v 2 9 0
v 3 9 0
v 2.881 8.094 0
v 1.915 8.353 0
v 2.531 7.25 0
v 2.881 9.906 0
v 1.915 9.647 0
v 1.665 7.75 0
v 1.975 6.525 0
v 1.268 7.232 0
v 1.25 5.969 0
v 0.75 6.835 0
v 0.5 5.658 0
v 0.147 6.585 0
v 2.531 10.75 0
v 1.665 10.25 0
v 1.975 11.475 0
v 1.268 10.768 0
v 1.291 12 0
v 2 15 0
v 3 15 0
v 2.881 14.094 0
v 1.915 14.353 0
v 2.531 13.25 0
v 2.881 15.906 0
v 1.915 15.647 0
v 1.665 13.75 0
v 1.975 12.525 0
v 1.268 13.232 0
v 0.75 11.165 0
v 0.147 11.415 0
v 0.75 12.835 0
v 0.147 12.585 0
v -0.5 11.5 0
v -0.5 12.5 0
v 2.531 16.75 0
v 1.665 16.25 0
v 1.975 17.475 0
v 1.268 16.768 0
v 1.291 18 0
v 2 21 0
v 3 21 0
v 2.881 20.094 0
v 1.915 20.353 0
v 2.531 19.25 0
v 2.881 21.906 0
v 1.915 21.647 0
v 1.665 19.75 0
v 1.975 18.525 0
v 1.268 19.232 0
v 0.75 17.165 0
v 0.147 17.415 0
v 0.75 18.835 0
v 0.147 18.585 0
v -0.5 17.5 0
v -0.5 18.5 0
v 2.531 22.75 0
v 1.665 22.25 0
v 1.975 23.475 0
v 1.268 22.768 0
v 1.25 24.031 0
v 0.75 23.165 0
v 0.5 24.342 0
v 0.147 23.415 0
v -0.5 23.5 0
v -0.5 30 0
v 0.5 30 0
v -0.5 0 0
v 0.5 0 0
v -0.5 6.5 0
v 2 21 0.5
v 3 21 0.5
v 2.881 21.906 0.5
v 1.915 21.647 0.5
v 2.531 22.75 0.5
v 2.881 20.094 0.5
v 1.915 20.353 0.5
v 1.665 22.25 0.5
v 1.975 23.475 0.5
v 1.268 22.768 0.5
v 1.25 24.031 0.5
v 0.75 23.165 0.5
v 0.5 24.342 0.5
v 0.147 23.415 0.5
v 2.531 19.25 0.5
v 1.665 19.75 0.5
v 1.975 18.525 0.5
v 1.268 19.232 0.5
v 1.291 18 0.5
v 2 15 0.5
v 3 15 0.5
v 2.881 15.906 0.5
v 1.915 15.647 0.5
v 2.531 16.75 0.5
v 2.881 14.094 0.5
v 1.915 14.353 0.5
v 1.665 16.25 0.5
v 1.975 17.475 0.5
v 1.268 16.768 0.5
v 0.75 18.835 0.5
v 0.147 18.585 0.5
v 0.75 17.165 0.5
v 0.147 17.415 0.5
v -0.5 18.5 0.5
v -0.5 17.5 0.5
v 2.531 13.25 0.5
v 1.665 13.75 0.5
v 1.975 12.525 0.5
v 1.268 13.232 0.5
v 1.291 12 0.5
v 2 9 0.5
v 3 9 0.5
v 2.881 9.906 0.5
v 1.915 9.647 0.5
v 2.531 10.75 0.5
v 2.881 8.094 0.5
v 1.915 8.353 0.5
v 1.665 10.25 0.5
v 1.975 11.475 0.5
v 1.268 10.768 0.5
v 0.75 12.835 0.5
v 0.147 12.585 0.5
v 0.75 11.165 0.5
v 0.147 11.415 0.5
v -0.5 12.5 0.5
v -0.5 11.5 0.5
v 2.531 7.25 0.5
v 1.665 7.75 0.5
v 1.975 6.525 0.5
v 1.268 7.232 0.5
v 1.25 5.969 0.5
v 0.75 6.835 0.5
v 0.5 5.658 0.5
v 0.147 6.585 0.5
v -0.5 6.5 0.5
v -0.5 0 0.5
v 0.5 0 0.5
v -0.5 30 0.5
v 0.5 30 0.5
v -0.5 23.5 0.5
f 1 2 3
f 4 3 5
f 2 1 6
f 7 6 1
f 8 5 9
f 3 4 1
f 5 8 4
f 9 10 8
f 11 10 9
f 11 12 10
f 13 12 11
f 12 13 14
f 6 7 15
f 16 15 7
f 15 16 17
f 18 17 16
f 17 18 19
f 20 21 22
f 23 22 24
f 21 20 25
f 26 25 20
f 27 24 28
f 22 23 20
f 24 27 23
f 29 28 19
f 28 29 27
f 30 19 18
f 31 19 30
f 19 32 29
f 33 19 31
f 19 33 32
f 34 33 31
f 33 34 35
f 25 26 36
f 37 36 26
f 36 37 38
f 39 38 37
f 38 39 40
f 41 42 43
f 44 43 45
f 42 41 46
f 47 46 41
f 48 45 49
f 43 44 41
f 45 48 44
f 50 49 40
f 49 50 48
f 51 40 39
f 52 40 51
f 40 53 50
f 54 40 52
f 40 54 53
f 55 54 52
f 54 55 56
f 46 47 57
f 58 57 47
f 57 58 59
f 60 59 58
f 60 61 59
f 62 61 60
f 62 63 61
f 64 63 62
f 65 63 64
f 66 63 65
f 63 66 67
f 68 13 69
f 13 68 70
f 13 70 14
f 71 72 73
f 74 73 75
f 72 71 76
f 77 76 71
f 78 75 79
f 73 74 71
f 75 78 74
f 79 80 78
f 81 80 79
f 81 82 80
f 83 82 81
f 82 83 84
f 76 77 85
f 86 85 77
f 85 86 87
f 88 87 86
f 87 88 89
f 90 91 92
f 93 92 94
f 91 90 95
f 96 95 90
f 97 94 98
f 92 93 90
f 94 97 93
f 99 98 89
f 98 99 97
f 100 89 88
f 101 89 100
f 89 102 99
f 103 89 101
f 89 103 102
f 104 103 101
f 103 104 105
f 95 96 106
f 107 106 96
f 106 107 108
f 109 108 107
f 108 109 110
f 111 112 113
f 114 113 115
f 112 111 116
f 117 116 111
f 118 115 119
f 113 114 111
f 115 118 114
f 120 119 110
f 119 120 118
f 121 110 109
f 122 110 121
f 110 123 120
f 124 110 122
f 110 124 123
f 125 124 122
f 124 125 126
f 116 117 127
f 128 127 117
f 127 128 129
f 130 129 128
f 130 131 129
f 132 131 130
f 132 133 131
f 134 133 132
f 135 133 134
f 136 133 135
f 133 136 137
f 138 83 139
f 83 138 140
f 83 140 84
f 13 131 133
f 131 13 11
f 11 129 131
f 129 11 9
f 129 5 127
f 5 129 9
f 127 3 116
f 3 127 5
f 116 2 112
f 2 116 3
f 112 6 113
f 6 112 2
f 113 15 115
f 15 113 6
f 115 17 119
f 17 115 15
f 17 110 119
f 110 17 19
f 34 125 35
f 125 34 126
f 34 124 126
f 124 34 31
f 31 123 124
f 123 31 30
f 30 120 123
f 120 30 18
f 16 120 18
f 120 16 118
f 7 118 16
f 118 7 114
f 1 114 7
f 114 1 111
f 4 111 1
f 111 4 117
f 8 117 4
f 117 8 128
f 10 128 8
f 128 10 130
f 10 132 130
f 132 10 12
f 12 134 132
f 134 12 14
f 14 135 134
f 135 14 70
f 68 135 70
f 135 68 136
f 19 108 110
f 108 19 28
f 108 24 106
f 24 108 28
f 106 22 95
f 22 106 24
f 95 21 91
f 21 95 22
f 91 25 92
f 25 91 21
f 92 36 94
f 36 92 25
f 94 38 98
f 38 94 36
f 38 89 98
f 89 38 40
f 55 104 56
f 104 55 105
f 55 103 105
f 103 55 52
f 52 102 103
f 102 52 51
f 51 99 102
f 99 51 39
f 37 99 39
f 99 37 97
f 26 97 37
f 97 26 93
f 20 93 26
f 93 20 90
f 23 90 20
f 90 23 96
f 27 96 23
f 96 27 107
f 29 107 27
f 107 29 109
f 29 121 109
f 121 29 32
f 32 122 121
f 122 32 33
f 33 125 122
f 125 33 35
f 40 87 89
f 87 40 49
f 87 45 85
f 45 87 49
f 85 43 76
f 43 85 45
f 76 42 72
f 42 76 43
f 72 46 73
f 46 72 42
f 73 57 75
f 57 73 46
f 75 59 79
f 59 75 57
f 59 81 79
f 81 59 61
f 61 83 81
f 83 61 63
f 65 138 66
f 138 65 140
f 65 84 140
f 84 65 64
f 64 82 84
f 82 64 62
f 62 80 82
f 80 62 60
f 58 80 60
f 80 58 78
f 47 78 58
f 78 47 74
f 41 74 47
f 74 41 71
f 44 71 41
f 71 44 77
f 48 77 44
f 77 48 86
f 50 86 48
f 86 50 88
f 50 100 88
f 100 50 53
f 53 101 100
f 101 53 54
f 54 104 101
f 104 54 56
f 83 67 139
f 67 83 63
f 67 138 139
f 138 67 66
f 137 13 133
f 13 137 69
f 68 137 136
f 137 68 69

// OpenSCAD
module sector(radius, angles, fn = 24) {
    r = radius / cos(180 / fn);
    step = -360 / fn;

    points = concat([[0, 0]],
        [for(a = [angles[0] : step : angles[1] - 360]) 
            [r * cos(a), r * sin(a)]
        ],
        [[r * cos(angles[1]), r * sin(angles[1])]]
    );

    difference() {
        circle(radius, $fn = fn);
        polygon(points);
    }
}

module arc(radius, angles, width, fn = 24) {
    difference() {
        sector(radius + width/2, angles, fn);
        sector(radius - width/2, angles, fn);
    }
} 

module arc_3d(radius, angles, width, depth, fn)
{
    linear_extrude(depth) arc(radius, angles, width);
}

module sym_inductor(height, depth, thickness, angle)
{
    n1 = 3;
    //translate([0,-thickness/2,0]) cube([height/6, 2*thickness, depth]);
    r1 = height/(2*n1+4);
    
    rotate([0,0,-angle])translate([-thickness/2, 0, 0]) cube([thickness, 2*r1, depth]);
    
    translate([2*r1*sin(angle), 2*r1*cos(-angle), 0])
    {
        translate([-thickness/2, r1,0]) arc_3d(r1, [-90, 90], thickness, depth, 120);
    
        translate([-thickness/2,3*r1,0]) arc_3d(r1, [-90, 90], thickness, depth, 120);

        translate([-thickness/2,5*r1,0]) arc_3d(r1, [-90, 90], thickness, depth, 120);

        translate([0,6*r1,0]) rotate([0,0,angle]) translate([-thickness/2, 0, 0]) cube([thickness, 2*r1, depth]);
    }

    
    //translate([0,height-1.5*thickness,0]) cube([height/6, 2*thickness, depth]);
}

sym_inductor(30, 0.5, 1, 0);
